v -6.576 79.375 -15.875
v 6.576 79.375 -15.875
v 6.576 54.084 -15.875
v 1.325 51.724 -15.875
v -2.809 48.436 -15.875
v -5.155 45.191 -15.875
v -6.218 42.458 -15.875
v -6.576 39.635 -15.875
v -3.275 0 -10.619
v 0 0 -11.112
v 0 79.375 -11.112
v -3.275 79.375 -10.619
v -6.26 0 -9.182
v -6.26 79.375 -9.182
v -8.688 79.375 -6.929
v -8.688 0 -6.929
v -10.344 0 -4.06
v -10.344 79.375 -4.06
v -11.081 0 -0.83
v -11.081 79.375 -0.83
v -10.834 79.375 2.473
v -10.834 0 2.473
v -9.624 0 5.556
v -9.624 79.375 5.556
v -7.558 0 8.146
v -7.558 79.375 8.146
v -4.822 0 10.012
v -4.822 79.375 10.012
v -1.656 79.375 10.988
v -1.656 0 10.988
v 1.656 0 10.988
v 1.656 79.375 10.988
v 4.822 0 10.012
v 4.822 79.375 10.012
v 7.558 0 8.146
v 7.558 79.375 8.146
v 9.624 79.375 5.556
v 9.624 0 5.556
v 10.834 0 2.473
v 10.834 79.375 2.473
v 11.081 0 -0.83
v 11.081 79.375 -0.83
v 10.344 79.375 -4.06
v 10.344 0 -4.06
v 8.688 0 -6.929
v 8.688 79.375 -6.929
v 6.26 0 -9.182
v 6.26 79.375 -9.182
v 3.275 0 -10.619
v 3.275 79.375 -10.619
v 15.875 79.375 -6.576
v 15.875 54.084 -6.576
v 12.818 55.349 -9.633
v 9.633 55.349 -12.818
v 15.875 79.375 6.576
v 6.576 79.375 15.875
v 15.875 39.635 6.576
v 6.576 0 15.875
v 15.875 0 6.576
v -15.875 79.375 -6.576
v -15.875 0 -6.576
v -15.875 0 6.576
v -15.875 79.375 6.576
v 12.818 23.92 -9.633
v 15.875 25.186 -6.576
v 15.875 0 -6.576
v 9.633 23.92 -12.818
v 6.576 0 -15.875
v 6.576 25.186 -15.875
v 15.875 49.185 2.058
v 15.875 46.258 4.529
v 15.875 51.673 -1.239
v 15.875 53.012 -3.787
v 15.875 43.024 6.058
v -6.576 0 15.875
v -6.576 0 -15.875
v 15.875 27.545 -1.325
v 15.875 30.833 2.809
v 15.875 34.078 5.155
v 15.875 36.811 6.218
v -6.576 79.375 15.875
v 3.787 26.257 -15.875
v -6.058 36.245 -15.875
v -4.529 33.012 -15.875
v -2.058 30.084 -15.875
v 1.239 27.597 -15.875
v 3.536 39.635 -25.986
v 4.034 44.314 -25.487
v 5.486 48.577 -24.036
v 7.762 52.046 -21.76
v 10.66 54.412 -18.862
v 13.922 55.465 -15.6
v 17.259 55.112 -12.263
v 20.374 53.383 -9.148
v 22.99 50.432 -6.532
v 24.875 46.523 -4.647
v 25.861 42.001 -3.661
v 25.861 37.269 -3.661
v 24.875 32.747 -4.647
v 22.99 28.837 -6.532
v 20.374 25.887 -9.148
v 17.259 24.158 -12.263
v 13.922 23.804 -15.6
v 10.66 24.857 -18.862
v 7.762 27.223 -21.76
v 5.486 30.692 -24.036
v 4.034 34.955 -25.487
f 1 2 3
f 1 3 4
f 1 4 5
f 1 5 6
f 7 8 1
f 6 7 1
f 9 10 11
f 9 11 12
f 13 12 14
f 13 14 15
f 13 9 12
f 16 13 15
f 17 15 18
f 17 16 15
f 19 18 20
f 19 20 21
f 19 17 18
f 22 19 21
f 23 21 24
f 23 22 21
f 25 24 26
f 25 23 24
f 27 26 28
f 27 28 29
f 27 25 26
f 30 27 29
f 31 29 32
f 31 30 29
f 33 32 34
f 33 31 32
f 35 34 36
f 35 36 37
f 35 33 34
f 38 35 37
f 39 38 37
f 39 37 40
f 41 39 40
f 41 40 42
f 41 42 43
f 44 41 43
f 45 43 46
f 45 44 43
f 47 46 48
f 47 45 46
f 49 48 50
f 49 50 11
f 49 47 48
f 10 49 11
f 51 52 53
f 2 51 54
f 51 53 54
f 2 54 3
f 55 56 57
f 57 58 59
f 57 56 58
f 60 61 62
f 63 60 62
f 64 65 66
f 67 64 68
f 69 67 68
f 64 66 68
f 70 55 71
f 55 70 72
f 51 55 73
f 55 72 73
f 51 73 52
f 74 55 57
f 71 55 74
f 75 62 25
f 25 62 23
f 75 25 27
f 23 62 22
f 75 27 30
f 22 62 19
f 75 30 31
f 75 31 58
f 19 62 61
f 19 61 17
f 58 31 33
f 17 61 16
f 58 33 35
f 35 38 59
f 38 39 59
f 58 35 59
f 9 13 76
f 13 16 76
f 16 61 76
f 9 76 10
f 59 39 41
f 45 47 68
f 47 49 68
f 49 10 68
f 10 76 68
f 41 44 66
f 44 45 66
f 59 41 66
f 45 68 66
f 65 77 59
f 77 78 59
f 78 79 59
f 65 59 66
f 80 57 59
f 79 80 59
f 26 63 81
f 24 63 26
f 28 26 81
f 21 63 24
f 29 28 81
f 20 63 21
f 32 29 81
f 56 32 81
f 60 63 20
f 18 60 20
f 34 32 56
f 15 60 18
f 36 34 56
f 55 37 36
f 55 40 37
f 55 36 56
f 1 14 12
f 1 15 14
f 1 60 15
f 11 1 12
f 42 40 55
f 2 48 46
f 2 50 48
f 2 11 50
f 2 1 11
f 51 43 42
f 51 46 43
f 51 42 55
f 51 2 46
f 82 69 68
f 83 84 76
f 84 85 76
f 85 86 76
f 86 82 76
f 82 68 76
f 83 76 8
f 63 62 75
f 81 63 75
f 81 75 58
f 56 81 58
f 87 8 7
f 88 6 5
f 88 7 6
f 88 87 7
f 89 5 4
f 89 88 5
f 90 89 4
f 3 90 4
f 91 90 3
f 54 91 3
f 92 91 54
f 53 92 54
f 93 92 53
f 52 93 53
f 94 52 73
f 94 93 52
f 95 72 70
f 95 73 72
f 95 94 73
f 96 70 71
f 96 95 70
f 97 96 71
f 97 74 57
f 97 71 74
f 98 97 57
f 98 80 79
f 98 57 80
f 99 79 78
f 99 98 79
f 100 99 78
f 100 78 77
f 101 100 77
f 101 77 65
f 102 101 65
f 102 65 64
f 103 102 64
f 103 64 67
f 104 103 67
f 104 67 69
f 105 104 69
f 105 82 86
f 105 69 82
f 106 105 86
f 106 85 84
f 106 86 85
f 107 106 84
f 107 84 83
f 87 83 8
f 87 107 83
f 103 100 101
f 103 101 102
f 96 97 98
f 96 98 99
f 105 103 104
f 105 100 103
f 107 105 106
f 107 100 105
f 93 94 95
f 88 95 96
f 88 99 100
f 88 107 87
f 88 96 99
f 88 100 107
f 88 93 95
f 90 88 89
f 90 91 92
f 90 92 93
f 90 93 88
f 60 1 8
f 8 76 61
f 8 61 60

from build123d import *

# Parameters (mm, degrees)
SKETCH1_R           = 11.1125
BOSS_EXTRUDE1_DEPTH = 79.375
BOSS_EXTRUDE2_REACH = 92.43
SKETCH2_R           = 15.875


with BuildPart() as part:
    # Sketch1 → Boss-Extrude1 (new body)
    with BuildSketch(Plane(origin=(0, 0, 0), x_dir=(1, 0, 0), z_dir=(0, 1, 0))):
        Polygon((6.575640303, -15.875), (15.875, -6.575640303), (15.875, 6.575640303), (6.575640303, 15.875), (-6.575640303, 15.875), (-15.875, 6.575640303), (-15.875, -6.575640303), (-6.575640303, -15.875), align=None)
        with Locations(Location((0, 0, 0), (0, 0, 90))):
            Circle(SKETCH1_R, mode=Mode.SUBTRACT)
    extrude(amount=BOSS_EXTRUDE1_DEPTH)

    # Sketch2 → Boss-Extrude2 (add, up to next)
    with BuildSketch(Plane(origin=(14.760854057, 0, -14.760854057), x_dir=(-0.7071067811865476, 0, -0.7071067811865475), z_dir=(0.7071067811865475, 0, -0.7071067811865476)), mode=Mode.PRIVATE) as boss_extrude2_sk1:
        with Locations((0, 39.634677984)):
            Circle(SKETCH2_R)
    boss_extrude2_tool1 = extrude(boss_extrude2_sk1.sketch, amount=-BOSS_EXTRUDE2_REACH, mode=Mode.PRIVATE) - part.part
    add(boss_extrude2_tool1.solids().sort_by_distance((14.760854, 39.634678, -14.760854))[0])


solid = part.part
